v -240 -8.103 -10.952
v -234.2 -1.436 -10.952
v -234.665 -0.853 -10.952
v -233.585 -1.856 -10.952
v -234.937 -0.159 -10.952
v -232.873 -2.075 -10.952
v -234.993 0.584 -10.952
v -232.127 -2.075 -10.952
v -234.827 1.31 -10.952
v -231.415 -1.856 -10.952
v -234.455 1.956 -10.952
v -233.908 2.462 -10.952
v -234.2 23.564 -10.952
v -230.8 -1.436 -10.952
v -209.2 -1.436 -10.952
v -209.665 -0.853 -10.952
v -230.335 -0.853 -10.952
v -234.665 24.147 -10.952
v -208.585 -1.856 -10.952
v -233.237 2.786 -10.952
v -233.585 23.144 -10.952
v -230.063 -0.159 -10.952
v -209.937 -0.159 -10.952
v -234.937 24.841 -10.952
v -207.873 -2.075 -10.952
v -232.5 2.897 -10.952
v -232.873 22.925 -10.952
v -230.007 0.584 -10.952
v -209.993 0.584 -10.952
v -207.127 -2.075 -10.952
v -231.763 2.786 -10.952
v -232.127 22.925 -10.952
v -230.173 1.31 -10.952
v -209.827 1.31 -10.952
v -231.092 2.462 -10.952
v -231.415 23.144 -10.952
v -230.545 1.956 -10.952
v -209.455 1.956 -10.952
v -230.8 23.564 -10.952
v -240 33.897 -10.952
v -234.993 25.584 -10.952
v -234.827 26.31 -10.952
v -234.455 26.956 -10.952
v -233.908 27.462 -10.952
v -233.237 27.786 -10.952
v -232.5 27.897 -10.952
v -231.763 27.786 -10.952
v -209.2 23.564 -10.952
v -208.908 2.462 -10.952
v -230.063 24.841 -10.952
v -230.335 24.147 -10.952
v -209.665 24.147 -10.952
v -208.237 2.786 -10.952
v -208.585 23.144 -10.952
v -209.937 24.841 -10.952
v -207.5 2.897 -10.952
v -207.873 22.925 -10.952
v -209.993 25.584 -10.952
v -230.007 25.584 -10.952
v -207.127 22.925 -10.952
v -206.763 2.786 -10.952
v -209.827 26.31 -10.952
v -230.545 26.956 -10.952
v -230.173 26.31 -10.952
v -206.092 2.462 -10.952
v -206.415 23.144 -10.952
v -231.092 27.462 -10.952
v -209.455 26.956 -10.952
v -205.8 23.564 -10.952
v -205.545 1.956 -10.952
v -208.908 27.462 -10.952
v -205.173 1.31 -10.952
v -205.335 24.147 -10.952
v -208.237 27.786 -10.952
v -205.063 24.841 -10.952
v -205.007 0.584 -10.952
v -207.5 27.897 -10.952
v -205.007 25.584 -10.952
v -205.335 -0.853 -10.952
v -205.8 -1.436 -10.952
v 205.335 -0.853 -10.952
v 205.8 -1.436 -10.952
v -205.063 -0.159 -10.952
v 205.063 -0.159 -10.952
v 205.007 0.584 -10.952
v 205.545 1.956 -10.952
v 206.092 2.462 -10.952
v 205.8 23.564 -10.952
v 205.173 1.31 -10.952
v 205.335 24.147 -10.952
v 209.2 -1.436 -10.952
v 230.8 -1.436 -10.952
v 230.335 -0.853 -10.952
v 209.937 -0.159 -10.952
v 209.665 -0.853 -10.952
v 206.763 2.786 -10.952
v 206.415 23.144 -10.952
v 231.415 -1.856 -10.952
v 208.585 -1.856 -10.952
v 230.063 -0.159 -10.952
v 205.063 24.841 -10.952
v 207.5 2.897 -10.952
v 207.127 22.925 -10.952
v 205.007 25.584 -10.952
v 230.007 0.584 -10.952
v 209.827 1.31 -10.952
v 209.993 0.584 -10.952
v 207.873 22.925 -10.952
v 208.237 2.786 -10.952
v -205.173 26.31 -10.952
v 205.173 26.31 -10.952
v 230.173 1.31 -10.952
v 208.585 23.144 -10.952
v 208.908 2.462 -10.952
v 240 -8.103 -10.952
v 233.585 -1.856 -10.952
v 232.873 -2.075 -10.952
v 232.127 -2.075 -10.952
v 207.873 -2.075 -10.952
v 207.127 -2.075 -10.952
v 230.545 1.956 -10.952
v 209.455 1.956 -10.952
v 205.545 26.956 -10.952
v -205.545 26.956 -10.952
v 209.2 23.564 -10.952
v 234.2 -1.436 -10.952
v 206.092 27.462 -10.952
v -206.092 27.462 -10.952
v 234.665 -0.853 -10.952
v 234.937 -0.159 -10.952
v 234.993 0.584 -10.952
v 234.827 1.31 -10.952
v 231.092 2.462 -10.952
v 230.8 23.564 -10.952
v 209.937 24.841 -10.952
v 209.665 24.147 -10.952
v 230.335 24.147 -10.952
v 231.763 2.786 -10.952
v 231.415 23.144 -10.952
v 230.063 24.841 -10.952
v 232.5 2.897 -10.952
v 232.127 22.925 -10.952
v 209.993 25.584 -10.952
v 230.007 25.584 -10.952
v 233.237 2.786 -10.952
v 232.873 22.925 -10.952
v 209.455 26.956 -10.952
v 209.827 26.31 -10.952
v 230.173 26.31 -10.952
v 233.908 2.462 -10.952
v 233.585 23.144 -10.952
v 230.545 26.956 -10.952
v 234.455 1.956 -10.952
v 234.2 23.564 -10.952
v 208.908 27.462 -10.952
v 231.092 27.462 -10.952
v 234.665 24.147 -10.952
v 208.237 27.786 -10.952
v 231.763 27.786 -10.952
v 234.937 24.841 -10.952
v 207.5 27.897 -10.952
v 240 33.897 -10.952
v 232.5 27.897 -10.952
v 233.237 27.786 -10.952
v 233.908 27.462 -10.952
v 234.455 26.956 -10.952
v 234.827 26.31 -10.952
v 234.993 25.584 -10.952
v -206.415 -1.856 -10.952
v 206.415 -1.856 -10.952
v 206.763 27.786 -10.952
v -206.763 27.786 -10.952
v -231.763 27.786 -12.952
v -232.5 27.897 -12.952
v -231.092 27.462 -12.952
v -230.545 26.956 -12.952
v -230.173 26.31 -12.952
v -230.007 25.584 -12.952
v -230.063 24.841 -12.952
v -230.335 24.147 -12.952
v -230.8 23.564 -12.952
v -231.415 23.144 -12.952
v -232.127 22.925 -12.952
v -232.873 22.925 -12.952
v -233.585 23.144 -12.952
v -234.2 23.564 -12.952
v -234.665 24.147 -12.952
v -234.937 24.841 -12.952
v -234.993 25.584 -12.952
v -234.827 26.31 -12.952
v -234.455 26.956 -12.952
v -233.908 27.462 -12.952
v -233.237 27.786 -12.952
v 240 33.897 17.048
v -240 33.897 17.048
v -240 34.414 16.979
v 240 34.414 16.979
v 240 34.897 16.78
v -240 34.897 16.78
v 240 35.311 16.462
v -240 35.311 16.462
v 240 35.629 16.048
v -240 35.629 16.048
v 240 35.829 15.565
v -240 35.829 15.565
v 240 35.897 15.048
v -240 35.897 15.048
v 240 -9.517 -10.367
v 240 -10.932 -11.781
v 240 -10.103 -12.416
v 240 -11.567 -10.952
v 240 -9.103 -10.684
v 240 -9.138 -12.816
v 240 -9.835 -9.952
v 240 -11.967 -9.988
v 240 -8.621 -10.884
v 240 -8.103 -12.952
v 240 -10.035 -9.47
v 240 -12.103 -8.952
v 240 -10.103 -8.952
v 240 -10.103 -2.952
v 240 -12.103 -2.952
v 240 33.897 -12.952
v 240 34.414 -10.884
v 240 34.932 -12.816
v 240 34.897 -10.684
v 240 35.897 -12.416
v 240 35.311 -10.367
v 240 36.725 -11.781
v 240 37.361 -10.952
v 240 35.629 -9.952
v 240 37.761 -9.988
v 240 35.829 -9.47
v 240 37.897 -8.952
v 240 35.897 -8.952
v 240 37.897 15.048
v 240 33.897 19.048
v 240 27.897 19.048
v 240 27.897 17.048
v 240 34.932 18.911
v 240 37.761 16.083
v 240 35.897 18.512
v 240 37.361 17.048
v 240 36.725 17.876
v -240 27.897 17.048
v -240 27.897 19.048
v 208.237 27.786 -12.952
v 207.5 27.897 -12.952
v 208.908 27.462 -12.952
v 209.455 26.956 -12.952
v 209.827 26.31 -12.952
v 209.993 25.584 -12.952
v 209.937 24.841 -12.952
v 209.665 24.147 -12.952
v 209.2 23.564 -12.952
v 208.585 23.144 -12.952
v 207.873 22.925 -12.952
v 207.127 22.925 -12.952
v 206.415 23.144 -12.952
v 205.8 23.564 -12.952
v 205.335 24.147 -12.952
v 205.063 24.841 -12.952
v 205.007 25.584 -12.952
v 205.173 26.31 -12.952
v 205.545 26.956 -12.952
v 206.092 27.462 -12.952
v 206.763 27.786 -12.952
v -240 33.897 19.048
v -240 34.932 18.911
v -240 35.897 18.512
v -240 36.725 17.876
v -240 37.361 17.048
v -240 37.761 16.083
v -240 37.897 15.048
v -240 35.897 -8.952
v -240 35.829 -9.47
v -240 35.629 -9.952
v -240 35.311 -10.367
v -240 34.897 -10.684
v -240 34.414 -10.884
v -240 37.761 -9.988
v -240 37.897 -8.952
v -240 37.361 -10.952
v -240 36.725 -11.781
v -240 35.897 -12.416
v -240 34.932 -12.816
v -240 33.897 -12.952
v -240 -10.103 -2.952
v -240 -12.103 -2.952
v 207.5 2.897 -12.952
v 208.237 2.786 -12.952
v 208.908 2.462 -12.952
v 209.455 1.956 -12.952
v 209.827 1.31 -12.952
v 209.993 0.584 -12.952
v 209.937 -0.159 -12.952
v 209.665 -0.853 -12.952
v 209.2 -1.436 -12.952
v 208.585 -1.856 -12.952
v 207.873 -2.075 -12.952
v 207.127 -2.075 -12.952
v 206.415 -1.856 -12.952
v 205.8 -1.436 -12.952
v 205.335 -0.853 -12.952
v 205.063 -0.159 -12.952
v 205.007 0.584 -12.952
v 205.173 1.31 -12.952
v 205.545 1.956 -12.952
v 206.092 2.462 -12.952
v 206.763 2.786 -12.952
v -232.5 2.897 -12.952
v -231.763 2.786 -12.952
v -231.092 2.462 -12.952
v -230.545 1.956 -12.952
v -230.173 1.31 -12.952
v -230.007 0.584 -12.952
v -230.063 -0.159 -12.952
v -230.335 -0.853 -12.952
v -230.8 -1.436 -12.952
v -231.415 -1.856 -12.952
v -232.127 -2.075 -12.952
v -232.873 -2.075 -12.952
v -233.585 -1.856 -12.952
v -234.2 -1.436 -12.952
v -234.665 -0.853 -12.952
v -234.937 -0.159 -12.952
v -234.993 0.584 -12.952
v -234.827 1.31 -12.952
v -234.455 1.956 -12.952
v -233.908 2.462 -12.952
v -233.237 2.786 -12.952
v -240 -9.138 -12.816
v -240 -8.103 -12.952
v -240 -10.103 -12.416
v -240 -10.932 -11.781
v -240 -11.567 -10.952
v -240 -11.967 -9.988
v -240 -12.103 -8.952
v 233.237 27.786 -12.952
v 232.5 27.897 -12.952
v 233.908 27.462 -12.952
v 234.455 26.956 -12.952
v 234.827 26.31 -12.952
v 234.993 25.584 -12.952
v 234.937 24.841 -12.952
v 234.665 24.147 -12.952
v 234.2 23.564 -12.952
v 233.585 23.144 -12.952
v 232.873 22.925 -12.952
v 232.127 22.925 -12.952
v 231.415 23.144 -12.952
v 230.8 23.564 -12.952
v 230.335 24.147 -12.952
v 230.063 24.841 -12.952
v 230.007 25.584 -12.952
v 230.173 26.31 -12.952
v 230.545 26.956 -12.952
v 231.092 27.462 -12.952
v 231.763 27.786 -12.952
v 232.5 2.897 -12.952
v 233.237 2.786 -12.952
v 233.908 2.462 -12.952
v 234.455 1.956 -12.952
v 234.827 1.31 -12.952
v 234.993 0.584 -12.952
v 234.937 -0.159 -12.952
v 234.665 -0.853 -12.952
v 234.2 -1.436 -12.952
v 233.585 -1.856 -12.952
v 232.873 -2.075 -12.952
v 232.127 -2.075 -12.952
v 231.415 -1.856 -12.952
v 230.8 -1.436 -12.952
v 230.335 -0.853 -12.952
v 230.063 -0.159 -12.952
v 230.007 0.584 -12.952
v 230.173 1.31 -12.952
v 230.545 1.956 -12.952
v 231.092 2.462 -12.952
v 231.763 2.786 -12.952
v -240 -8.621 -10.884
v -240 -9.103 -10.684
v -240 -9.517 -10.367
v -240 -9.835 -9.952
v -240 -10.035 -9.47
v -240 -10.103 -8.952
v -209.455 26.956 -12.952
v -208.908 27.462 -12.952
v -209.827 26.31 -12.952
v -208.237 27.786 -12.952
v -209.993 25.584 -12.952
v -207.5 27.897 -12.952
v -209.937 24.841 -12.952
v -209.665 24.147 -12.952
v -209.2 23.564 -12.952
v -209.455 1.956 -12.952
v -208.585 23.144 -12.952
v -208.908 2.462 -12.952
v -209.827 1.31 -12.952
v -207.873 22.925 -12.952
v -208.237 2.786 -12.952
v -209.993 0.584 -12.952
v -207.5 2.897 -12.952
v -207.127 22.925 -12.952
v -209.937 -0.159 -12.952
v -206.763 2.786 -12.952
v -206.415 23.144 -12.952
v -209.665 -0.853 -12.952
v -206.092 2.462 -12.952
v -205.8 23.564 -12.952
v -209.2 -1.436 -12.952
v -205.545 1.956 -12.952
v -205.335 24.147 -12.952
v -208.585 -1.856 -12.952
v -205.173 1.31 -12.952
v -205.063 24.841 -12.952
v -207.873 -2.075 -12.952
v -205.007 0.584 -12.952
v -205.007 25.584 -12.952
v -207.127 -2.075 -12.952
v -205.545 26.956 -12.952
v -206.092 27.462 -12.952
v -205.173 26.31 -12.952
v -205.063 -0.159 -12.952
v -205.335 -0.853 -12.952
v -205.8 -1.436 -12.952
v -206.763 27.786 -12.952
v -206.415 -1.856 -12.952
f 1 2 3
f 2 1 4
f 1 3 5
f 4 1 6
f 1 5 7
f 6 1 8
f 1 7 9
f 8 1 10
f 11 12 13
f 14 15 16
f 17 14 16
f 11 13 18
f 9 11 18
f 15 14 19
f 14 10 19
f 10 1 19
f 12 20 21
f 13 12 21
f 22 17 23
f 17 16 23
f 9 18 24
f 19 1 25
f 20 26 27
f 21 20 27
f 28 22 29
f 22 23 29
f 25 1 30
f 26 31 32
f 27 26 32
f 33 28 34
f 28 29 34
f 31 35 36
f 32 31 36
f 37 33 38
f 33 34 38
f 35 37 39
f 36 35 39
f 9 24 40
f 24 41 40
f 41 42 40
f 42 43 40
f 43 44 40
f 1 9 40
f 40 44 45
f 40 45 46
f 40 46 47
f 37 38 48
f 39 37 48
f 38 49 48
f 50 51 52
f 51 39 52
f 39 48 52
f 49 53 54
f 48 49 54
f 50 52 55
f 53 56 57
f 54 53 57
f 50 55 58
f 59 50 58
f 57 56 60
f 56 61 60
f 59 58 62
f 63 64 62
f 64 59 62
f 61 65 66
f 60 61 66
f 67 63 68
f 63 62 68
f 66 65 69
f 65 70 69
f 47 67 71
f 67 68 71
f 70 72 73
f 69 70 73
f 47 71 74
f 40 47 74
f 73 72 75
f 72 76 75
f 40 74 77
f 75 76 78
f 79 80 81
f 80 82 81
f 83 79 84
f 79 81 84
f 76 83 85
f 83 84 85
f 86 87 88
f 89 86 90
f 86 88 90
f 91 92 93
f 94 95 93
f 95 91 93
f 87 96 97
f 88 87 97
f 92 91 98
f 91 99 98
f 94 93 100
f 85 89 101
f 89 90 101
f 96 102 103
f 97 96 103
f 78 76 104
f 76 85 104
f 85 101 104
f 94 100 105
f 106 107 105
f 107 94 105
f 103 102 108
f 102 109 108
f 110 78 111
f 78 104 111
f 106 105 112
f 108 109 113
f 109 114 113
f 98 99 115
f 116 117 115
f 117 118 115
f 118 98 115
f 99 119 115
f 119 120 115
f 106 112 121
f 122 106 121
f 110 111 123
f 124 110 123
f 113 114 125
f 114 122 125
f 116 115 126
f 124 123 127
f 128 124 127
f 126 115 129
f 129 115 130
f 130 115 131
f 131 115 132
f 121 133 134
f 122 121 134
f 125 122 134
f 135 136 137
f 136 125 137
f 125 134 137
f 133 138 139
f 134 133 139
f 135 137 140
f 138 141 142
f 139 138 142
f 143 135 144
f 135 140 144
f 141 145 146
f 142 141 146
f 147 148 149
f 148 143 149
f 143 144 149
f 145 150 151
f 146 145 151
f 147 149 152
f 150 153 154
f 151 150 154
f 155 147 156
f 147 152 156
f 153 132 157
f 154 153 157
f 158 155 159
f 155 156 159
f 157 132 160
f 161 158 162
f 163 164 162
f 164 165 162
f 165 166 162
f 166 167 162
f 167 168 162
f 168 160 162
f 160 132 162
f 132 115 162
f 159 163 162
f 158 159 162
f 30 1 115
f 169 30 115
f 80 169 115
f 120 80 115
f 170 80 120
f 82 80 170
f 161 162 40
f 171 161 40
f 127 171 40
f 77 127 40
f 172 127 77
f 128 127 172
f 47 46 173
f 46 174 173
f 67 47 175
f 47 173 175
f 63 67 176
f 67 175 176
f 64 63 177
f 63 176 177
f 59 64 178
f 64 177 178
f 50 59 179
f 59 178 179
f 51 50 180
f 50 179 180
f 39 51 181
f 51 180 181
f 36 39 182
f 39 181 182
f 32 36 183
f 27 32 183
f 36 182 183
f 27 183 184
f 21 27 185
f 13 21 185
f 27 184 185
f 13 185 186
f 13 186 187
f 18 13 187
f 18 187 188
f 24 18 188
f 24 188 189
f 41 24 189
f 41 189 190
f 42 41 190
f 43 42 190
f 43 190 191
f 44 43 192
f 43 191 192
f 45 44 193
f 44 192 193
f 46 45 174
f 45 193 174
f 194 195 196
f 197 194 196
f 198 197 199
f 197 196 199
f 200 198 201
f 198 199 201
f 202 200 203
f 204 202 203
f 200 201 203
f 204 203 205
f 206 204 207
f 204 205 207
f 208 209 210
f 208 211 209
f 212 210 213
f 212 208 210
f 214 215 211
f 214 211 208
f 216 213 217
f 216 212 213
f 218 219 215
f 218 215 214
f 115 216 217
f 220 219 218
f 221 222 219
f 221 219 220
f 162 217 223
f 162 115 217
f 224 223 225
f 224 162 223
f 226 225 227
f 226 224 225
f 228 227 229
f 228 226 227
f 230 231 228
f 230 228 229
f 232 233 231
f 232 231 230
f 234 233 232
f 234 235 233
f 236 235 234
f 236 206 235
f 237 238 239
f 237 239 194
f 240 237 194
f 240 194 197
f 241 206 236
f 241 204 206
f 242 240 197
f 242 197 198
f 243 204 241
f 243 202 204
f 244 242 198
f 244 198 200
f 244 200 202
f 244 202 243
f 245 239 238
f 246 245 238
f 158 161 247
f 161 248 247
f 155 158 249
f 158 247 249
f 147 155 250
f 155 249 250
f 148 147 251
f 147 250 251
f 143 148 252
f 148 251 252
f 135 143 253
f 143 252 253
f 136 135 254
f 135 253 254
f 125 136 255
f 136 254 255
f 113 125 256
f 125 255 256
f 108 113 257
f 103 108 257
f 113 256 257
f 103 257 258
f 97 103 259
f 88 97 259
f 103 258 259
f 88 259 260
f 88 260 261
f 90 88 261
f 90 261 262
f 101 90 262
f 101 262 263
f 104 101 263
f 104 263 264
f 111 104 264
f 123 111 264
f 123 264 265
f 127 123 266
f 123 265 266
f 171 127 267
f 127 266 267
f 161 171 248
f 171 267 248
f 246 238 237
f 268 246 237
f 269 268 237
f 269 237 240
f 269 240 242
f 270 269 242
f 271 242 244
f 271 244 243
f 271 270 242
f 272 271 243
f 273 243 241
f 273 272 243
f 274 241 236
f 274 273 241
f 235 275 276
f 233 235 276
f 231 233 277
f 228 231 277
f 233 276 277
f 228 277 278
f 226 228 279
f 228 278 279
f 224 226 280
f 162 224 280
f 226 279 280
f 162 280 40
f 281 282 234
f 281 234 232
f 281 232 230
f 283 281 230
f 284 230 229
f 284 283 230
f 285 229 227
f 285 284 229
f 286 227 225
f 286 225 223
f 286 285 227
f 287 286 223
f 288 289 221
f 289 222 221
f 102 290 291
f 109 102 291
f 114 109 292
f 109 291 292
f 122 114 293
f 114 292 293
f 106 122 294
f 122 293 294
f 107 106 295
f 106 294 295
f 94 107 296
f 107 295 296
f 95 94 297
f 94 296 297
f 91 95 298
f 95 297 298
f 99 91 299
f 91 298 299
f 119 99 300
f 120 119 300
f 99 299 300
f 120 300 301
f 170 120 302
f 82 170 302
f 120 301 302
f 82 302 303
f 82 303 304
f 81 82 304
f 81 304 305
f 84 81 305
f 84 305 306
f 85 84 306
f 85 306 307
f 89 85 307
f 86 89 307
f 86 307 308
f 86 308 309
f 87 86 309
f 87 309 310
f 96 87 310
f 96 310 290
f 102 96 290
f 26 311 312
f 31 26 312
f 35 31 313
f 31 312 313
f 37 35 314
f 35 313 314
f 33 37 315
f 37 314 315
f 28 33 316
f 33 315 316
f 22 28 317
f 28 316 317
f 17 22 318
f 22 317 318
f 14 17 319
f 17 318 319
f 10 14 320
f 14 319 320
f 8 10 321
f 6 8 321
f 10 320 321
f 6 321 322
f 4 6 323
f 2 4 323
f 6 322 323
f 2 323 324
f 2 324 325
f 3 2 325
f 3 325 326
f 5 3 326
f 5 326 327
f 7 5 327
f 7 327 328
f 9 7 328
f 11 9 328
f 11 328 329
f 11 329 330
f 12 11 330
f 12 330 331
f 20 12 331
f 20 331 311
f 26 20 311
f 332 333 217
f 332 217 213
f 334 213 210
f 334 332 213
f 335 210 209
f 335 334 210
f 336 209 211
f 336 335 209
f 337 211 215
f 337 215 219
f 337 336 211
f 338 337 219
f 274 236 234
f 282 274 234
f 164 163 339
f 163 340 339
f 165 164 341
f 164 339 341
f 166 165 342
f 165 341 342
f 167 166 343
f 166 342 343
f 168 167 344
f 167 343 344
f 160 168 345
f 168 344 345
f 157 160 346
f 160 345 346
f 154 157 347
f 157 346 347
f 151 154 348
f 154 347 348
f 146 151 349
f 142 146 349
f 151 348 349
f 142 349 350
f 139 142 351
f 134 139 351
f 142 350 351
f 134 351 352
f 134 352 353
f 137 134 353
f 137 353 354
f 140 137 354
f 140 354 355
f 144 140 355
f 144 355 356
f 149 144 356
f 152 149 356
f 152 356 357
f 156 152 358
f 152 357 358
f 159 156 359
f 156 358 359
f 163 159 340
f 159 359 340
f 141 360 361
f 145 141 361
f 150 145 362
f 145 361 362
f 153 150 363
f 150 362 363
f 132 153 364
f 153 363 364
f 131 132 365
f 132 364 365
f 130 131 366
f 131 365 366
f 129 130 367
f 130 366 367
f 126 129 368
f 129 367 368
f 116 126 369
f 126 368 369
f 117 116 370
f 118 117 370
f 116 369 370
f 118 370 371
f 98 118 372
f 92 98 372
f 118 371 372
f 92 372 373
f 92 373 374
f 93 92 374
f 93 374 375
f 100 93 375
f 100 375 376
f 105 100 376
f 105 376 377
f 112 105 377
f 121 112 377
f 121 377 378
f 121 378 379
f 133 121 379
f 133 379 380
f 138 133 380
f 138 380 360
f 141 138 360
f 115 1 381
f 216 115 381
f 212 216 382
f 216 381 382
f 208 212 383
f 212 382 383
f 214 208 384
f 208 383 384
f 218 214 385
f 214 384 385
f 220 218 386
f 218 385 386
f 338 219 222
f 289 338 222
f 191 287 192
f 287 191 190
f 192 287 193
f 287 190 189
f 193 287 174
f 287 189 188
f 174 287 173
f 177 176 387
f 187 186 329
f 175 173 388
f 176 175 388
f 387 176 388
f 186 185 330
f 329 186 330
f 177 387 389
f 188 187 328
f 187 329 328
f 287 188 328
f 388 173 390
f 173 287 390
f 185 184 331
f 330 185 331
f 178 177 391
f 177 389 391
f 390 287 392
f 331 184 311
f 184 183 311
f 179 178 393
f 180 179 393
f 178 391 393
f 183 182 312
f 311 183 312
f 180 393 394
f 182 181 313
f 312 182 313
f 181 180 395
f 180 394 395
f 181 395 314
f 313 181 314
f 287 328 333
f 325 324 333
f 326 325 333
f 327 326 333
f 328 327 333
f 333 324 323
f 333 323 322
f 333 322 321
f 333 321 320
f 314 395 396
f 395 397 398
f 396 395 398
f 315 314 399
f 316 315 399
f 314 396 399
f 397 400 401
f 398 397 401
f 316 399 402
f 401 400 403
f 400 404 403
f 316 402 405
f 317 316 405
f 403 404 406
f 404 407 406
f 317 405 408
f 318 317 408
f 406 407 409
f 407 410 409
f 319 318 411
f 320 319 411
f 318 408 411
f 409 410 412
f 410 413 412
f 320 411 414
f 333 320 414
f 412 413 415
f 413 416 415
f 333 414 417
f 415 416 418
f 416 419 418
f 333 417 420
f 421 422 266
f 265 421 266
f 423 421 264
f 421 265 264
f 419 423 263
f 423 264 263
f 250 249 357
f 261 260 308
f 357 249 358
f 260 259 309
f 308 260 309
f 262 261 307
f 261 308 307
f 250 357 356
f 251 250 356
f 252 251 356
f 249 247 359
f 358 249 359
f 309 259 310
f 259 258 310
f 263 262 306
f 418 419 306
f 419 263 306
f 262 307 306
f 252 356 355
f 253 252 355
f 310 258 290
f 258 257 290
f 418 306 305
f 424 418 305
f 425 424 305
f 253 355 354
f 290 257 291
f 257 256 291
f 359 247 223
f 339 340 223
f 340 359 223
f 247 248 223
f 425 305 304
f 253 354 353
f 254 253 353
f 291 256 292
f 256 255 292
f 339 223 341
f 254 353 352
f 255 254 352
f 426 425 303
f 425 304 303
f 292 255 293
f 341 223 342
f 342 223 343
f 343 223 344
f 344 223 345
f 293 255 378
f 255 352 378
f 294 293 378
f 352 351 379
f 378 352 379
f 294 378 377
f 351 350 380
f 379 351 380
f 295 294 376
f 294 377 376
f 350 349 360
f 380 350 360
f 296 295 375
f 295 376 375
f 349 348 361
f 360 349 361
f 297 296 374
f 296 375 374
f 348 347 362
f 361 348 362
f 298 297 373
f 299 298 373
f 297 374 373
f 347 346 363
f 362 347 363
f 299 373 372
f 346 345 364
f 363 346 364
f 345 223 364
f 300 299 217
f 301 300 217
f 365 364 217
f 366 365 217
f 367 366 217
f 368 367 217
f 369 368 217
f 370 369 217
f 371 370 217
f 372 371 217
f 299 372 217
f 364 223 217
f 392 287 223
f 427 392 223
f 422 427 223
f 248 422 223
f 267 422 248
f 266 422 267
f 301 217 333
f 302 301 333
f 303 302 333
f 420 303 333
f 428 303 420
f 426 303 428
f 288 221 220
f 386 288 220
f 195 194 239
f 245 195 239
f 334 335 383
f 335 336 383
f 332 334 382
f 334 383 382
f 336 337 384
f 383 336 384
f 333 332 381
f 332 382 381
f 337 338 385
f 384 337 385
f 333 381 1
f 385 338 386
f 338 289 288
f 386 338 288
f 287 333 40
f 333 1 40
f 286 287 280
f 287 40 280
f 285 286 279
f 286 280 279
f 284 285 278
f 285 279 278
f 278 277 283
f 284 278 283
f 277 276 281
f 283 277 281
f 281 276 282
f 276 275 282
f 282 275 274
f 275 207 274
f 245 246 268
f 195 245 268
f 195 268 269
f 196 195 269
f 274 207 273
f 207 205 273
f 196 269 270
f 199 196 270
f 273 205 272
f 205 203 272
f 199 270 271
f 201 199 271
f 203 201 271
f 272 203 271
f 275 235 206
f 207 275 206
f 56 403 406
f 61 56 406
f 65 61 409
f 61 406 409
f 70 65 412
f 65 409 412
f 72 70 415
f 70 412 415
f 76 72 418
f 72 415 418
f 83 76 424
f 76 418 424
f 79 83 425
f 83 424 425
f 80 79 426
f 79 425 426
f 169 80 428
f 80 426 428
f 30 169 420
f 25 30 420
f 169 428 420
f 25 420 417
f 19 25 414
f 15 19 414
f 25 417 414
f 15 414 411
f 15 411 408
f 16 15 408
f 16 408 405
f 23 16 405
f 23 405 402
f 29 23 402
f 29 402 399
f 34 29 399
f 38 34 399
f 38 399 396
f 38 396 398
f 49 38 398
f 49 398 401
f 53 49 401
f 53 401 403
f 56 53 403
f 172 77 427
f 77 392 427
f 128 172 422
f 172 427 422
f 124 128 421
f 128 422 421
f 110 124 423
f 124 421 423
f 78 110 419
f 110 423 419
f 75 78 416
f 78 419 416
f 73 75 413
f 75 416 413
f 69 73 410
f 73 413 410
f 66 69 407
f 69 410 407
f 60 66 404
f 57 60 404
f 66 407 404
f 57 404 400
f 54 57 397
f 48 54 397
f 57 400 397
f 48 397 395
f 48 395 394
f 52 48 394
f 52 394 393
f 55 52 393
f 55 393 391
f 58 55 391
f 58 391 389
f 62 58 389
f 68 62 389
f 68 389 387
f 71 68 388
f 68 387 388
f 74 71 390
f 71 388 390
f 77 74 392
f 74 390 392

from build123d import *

# Parameters (mm, degrees)
EXTRUDE_1_DEPTH       = 240
SHEET_START           = -240
SHEET_METAL_1_DEPTH   = 480
SHEET_METAL_1_2_DEPTH = 480
CUT_EXTRUDE_1_REACH   = 247.072
SKETCH_7_R            = 2.5


# Read off the part's stored shape, not the designer's step: Преобразовать-Твердое тело1
with BuildPart() as part:
    # Sketch 1 → Вытянуть-Тонкостенный1 (new, symmetric)
    with BuildSketch(Plane(origin=(0, 0, 0), x_dir=(0, 0, -1), z_dir=(1, 0, 0))):
        Polygon((-19.047619048, 27.896825397), (-19.047619048, 37.896825397), (12.952380952, 37.896825397), (12.952380952, -12.103174603), (2.952380952, -12.103174603), (2.952380952, -10.103174603), (10.952380952, -10.103174603), (10.952380952, 35.896825397), (-17.047619048, 35.896825397), (-17.047619048, 27.896825397), align=None)
    extrude(amount=EXTRUDE_1_DEPTH, both=True)

    # Sheet Metal 1 outline → Sheet Metal 1 (cut)
    with BuildSketch(Plane.YZ.offset(SHEET_START)):
        with BuildLine():
            Line((-12.103174603, -12.952380952), (-8.103174603, -12.952380952))
            ThreePointArc((-8.103174603, -12.952380952), (-10.931601728, -11.780808077), (-12.103174603, -8.952380952))
            Line((-12.103174603, -8.952380952), (-12.103174603, -12.952380952))
        make_face()
        with BuildLine():
            ThreePointArc((33.896825397, 19.047619048), (36.725252521, 17.876046172), (37.896825397, 15.047619048))
            Line((37.896825397, 15.047619048), (37.896825397, 19.047619048))
            Line((37.896825397, 19.047619048), (33.896825397, 19.047619048))
        make_face()
        with BuildLine():
            ThreePointArc((37.896825397, -8.952380952), (36.725252522, -11.780808077), (33.896825397, -12.952380952))
            Line((33.896825397, -12.952380952), (37.896825397, -12.952380952))
            Line((37.896825397, -12.952380952), (37.896825397, -8.952380952))
        make_face()
    extrude(amount=SHEET_METAL_1_DEPTH, mode=Mode.SUBTRACT)

    # Sheet Metal 1 2 outline → Sheet Metal 1 2 (add)
    with BuildSketch(Plane.YZ.offset(SHEET_START)):
        with BuildLine():
            Line((-10.103174603, -10.952380952), (-8.103174603, -10.952380952))
            ThreePointArc((-8.103174603, -10.952380952), (-9.517388166, -10.366594515), (-10.103174603, -8.952380952))
            Line((-10.103174603, -8.952380952), (-10.103174603, -10.952380952))
        make_face()
        with BuildLine():
            ThreePointArc((33.896825397, 17.047619048), (35.311038959, 16.46183261), (35.896825397, 15.047619048))
            Line((35.896825397, 15.047619048), (35.896825397, 17.047619048))
            Line((35.896825397, 17.047619048), (33.896825397, 17.047619048))
        make_face()
        with BuildLine():
            ThreePointArc((35.896825397, -8.952380952), (35.31103896, -10.366594515), (33.896825397, -10.952380952))
            Line((33.896825397, -10.952380952), (35.896825397, -10.952380952))
            Line((35.896825397, -10.952380952), (35.896825397, -8.952380952))
        make_face()
    extrude(amount=SHEET_METAL_1_2_DEPTH)

    # Эскиз7 → Вырез-Вытянуть1 (cut, up to next)
    with BuildSketch(Plane(origin=(0, 0, -12.952380952), x_dir=(-1, 0, 0), z_dir=(0, 0, -1)), mode=Mode.PRIVATE) as cut_extrude_1_sk1:
        with Locations(Location((-207.5, 25.396825397, 0), (0, 0, 90))):
            Circle(SKETCH_7_R)
    cut_extrude_1_tool1 = extrude(cut_extrude_1_sk1.sketch, amount=-CUT_EXTRUDE_1_REACH, mode=Mode.PRIVATE) & part.part
    # Эскиз7 → Вырез-Вытянуть1 (cut, up to next)
    with BuildSketch(Plane(origin=(0, 0, -12.952380952), x_dir=(-1, 0, 0), z_dir=(0, 0, -1)), mode=Mode.PRIVATE) as cut_extrude_1_sk2:
        with Locations(Location((-232.5, 25.396825397, 0), (0, 0, 90))):
            Circle(SKETCH_7_R)
    cut_extrude_1_tool2 = extrude(cut_extrude_1_sk2.sketch, amount=-CUT_EXTRUDE_1_REACH, mode=Mode.PRIVATE) & part.part
    # Эскиз7 → Вырез-Вытянуть1 (cut, up to next)
    with BuildSketch(Plane(origin=(0, 0, -12.952380952), x_dir=(-1, 0, 0), z_dir=(0, 0, -1)), mode=Mode.PRIVATE) as cut_extrude_1_sk3:
        with Locations(Location((-232.5, 0.396825397, 0), (0, 0, 90))):
            Circle(SKETCH_7_R)
    cut_extrude_1_tool3 = extrude(cut_extrude_1_sk3.sketch, amount=-CUT_EXTRUDE_1_REACH, mode=Mode.PRIVATE) & part.part
    # Эскиз7 → Вырез-Вытянуть1 (cut, up to next)
    with BuildSketch(Plane(origin=(0, 0, -12.952380952), x_dir=(-1, 0, 0), z_dir=(0, 0, -1)), mode=Mode.PRIVATE) as cut_extrude_1_sk4:
        with Locations(Location((-207.5, 0.396825397, 0), (0, 0, 90))):
            Circle(SKETCH_7_R)
    cut_extrude_1_tool4 = extrude(cut_extrude_1_sk4.sketch, amount=-CUT_EXTRUDE_1_REACH, mode=Mode.PRIVATE) & part.part
    # Эскиз7 → Вырез-Вытянуть1 (cut, up to next)
    with BuildSketch(Plane(origin=(0, 0, -12.952380952), x_dir=(-1, 0, 0), z_dir=(0, 0, -1)), mode=Mode.PRIVATE) as cut_extrude_1_sk5:
        with Locations(Location((232.5, 25.396825397, 0), (0, 0, 90))):
            Circle(SKETCH_7_R)
    cut_extrude_1_tool5 = extrude(cut_extrude_1_sk5.sketch, amount=-CUT_EXTRUDE_1_REACH, mode=Mode.PRIVATE) & part.part
    # Эскиз7 → Вырез-Вытянуть1 (cut, up to next)
    with BuildSketch(Plane(origin=(0, 0, -12.952380952), x_dir=(-1, 0, 0), z_dir=(0, 0, -1)), mode=Mode.PRIVATE) as cut_extrude_1_sk6:
        with Locations(Location((207.5, 25.396825397, 0), (0, 0, 90))):
            Circle(SKETCH_7_R)
    cut_extrude_1_tool6 = extrude(cut_extrude_1_sk6.sketch, amount=-CUT_EXTRUDE_1_REACH, mode=Mode.PRIVATE) & part.part
    # Эскиз7 → Вырез-Вытянуть1 (cut, up to next)
    with BuildSketch(Plane(origin=(0, 0, -12.952380952), x_dir=(-1, 0, 0), z_dir=(0, 0, -1)), mode=Mode.PRIVATE) as cut_extrude_1_sk7:
        with Locations(Location((207.5, 0.396825397, 0), (0, 0, 90))):
            Circle(SKETCH_7_R)
    cut_extrude_1_tool7 = extrude(cut_extrude_1_sk7.sketch, amount=-CUT_EXTRUDE_1_REACH, mode=Mode.PRIVATE) & part.part
    # Эскиз7 → Вырез-Вытянуть1 (cut, up to next)
    with BuildSketch(Plane(origin=(0, 0, -12.952380952), x_dir=(-1, 0, 0), z_dir=(0, 0, -1)), mode=Mode.PRIVATE) as cut_extrude_1_sk8:
        with Locations(Location((232.5, 0.396825397, 0), (0, 0, 90))):
            Circle(SKETCH_7_R)
    cut_extrude_1_tool8 = extrude(cut_extrude_1_sk8.sketch, amount=-CUT_EXTRUDE_1_REACH, mode=Mode.PRIVATE) & part.part
    add(cut_extrude_1_tool1.solids().sort_by_distance((207.5, 25.396825, -12.952381))[0], mode=Mode.SUBTRACT)
    add(cut_extrude_1_tool2.solids().sort_by_distance((232.5, 25.396825, -12.952381))[0], mode=Mode.SUBTRACT)
    add(cut_extrude_1_tool3.solids().sort_by_distance((232.5, 0.396825, -12.952381))[0], mode=Mode.SUBTRACT)
    add(cut_extrude_1_tool4.solids().sort_by_distance((207.5, 0.396825, -12.952381))[0], mode=Mode.SUBTRACT)
    add(cut_extrude_1_tool5.solids().sort_by_distance((-232.5, 25.396825, -12.952381))[0], mode=Mode.SUBTRACT)
    add(cut_extrude_1_tool6.solids().sort_by_distance((-207.5, 25.396825, -12.952381))[0], mode=Mode.SUBTRACT)
    add(cut_extrude_1_tool7.solids().sort_by_distance((-207.5, 0.396825, -12.952381))[0], mode=Mode.SUBTRACT)
    add(cut_extrude_1_tool8.solids().sort_by_distance((-232.5, 0.396825, -12.952381))[0], mode=Mode.SUBTRACT)


solid = part.part
